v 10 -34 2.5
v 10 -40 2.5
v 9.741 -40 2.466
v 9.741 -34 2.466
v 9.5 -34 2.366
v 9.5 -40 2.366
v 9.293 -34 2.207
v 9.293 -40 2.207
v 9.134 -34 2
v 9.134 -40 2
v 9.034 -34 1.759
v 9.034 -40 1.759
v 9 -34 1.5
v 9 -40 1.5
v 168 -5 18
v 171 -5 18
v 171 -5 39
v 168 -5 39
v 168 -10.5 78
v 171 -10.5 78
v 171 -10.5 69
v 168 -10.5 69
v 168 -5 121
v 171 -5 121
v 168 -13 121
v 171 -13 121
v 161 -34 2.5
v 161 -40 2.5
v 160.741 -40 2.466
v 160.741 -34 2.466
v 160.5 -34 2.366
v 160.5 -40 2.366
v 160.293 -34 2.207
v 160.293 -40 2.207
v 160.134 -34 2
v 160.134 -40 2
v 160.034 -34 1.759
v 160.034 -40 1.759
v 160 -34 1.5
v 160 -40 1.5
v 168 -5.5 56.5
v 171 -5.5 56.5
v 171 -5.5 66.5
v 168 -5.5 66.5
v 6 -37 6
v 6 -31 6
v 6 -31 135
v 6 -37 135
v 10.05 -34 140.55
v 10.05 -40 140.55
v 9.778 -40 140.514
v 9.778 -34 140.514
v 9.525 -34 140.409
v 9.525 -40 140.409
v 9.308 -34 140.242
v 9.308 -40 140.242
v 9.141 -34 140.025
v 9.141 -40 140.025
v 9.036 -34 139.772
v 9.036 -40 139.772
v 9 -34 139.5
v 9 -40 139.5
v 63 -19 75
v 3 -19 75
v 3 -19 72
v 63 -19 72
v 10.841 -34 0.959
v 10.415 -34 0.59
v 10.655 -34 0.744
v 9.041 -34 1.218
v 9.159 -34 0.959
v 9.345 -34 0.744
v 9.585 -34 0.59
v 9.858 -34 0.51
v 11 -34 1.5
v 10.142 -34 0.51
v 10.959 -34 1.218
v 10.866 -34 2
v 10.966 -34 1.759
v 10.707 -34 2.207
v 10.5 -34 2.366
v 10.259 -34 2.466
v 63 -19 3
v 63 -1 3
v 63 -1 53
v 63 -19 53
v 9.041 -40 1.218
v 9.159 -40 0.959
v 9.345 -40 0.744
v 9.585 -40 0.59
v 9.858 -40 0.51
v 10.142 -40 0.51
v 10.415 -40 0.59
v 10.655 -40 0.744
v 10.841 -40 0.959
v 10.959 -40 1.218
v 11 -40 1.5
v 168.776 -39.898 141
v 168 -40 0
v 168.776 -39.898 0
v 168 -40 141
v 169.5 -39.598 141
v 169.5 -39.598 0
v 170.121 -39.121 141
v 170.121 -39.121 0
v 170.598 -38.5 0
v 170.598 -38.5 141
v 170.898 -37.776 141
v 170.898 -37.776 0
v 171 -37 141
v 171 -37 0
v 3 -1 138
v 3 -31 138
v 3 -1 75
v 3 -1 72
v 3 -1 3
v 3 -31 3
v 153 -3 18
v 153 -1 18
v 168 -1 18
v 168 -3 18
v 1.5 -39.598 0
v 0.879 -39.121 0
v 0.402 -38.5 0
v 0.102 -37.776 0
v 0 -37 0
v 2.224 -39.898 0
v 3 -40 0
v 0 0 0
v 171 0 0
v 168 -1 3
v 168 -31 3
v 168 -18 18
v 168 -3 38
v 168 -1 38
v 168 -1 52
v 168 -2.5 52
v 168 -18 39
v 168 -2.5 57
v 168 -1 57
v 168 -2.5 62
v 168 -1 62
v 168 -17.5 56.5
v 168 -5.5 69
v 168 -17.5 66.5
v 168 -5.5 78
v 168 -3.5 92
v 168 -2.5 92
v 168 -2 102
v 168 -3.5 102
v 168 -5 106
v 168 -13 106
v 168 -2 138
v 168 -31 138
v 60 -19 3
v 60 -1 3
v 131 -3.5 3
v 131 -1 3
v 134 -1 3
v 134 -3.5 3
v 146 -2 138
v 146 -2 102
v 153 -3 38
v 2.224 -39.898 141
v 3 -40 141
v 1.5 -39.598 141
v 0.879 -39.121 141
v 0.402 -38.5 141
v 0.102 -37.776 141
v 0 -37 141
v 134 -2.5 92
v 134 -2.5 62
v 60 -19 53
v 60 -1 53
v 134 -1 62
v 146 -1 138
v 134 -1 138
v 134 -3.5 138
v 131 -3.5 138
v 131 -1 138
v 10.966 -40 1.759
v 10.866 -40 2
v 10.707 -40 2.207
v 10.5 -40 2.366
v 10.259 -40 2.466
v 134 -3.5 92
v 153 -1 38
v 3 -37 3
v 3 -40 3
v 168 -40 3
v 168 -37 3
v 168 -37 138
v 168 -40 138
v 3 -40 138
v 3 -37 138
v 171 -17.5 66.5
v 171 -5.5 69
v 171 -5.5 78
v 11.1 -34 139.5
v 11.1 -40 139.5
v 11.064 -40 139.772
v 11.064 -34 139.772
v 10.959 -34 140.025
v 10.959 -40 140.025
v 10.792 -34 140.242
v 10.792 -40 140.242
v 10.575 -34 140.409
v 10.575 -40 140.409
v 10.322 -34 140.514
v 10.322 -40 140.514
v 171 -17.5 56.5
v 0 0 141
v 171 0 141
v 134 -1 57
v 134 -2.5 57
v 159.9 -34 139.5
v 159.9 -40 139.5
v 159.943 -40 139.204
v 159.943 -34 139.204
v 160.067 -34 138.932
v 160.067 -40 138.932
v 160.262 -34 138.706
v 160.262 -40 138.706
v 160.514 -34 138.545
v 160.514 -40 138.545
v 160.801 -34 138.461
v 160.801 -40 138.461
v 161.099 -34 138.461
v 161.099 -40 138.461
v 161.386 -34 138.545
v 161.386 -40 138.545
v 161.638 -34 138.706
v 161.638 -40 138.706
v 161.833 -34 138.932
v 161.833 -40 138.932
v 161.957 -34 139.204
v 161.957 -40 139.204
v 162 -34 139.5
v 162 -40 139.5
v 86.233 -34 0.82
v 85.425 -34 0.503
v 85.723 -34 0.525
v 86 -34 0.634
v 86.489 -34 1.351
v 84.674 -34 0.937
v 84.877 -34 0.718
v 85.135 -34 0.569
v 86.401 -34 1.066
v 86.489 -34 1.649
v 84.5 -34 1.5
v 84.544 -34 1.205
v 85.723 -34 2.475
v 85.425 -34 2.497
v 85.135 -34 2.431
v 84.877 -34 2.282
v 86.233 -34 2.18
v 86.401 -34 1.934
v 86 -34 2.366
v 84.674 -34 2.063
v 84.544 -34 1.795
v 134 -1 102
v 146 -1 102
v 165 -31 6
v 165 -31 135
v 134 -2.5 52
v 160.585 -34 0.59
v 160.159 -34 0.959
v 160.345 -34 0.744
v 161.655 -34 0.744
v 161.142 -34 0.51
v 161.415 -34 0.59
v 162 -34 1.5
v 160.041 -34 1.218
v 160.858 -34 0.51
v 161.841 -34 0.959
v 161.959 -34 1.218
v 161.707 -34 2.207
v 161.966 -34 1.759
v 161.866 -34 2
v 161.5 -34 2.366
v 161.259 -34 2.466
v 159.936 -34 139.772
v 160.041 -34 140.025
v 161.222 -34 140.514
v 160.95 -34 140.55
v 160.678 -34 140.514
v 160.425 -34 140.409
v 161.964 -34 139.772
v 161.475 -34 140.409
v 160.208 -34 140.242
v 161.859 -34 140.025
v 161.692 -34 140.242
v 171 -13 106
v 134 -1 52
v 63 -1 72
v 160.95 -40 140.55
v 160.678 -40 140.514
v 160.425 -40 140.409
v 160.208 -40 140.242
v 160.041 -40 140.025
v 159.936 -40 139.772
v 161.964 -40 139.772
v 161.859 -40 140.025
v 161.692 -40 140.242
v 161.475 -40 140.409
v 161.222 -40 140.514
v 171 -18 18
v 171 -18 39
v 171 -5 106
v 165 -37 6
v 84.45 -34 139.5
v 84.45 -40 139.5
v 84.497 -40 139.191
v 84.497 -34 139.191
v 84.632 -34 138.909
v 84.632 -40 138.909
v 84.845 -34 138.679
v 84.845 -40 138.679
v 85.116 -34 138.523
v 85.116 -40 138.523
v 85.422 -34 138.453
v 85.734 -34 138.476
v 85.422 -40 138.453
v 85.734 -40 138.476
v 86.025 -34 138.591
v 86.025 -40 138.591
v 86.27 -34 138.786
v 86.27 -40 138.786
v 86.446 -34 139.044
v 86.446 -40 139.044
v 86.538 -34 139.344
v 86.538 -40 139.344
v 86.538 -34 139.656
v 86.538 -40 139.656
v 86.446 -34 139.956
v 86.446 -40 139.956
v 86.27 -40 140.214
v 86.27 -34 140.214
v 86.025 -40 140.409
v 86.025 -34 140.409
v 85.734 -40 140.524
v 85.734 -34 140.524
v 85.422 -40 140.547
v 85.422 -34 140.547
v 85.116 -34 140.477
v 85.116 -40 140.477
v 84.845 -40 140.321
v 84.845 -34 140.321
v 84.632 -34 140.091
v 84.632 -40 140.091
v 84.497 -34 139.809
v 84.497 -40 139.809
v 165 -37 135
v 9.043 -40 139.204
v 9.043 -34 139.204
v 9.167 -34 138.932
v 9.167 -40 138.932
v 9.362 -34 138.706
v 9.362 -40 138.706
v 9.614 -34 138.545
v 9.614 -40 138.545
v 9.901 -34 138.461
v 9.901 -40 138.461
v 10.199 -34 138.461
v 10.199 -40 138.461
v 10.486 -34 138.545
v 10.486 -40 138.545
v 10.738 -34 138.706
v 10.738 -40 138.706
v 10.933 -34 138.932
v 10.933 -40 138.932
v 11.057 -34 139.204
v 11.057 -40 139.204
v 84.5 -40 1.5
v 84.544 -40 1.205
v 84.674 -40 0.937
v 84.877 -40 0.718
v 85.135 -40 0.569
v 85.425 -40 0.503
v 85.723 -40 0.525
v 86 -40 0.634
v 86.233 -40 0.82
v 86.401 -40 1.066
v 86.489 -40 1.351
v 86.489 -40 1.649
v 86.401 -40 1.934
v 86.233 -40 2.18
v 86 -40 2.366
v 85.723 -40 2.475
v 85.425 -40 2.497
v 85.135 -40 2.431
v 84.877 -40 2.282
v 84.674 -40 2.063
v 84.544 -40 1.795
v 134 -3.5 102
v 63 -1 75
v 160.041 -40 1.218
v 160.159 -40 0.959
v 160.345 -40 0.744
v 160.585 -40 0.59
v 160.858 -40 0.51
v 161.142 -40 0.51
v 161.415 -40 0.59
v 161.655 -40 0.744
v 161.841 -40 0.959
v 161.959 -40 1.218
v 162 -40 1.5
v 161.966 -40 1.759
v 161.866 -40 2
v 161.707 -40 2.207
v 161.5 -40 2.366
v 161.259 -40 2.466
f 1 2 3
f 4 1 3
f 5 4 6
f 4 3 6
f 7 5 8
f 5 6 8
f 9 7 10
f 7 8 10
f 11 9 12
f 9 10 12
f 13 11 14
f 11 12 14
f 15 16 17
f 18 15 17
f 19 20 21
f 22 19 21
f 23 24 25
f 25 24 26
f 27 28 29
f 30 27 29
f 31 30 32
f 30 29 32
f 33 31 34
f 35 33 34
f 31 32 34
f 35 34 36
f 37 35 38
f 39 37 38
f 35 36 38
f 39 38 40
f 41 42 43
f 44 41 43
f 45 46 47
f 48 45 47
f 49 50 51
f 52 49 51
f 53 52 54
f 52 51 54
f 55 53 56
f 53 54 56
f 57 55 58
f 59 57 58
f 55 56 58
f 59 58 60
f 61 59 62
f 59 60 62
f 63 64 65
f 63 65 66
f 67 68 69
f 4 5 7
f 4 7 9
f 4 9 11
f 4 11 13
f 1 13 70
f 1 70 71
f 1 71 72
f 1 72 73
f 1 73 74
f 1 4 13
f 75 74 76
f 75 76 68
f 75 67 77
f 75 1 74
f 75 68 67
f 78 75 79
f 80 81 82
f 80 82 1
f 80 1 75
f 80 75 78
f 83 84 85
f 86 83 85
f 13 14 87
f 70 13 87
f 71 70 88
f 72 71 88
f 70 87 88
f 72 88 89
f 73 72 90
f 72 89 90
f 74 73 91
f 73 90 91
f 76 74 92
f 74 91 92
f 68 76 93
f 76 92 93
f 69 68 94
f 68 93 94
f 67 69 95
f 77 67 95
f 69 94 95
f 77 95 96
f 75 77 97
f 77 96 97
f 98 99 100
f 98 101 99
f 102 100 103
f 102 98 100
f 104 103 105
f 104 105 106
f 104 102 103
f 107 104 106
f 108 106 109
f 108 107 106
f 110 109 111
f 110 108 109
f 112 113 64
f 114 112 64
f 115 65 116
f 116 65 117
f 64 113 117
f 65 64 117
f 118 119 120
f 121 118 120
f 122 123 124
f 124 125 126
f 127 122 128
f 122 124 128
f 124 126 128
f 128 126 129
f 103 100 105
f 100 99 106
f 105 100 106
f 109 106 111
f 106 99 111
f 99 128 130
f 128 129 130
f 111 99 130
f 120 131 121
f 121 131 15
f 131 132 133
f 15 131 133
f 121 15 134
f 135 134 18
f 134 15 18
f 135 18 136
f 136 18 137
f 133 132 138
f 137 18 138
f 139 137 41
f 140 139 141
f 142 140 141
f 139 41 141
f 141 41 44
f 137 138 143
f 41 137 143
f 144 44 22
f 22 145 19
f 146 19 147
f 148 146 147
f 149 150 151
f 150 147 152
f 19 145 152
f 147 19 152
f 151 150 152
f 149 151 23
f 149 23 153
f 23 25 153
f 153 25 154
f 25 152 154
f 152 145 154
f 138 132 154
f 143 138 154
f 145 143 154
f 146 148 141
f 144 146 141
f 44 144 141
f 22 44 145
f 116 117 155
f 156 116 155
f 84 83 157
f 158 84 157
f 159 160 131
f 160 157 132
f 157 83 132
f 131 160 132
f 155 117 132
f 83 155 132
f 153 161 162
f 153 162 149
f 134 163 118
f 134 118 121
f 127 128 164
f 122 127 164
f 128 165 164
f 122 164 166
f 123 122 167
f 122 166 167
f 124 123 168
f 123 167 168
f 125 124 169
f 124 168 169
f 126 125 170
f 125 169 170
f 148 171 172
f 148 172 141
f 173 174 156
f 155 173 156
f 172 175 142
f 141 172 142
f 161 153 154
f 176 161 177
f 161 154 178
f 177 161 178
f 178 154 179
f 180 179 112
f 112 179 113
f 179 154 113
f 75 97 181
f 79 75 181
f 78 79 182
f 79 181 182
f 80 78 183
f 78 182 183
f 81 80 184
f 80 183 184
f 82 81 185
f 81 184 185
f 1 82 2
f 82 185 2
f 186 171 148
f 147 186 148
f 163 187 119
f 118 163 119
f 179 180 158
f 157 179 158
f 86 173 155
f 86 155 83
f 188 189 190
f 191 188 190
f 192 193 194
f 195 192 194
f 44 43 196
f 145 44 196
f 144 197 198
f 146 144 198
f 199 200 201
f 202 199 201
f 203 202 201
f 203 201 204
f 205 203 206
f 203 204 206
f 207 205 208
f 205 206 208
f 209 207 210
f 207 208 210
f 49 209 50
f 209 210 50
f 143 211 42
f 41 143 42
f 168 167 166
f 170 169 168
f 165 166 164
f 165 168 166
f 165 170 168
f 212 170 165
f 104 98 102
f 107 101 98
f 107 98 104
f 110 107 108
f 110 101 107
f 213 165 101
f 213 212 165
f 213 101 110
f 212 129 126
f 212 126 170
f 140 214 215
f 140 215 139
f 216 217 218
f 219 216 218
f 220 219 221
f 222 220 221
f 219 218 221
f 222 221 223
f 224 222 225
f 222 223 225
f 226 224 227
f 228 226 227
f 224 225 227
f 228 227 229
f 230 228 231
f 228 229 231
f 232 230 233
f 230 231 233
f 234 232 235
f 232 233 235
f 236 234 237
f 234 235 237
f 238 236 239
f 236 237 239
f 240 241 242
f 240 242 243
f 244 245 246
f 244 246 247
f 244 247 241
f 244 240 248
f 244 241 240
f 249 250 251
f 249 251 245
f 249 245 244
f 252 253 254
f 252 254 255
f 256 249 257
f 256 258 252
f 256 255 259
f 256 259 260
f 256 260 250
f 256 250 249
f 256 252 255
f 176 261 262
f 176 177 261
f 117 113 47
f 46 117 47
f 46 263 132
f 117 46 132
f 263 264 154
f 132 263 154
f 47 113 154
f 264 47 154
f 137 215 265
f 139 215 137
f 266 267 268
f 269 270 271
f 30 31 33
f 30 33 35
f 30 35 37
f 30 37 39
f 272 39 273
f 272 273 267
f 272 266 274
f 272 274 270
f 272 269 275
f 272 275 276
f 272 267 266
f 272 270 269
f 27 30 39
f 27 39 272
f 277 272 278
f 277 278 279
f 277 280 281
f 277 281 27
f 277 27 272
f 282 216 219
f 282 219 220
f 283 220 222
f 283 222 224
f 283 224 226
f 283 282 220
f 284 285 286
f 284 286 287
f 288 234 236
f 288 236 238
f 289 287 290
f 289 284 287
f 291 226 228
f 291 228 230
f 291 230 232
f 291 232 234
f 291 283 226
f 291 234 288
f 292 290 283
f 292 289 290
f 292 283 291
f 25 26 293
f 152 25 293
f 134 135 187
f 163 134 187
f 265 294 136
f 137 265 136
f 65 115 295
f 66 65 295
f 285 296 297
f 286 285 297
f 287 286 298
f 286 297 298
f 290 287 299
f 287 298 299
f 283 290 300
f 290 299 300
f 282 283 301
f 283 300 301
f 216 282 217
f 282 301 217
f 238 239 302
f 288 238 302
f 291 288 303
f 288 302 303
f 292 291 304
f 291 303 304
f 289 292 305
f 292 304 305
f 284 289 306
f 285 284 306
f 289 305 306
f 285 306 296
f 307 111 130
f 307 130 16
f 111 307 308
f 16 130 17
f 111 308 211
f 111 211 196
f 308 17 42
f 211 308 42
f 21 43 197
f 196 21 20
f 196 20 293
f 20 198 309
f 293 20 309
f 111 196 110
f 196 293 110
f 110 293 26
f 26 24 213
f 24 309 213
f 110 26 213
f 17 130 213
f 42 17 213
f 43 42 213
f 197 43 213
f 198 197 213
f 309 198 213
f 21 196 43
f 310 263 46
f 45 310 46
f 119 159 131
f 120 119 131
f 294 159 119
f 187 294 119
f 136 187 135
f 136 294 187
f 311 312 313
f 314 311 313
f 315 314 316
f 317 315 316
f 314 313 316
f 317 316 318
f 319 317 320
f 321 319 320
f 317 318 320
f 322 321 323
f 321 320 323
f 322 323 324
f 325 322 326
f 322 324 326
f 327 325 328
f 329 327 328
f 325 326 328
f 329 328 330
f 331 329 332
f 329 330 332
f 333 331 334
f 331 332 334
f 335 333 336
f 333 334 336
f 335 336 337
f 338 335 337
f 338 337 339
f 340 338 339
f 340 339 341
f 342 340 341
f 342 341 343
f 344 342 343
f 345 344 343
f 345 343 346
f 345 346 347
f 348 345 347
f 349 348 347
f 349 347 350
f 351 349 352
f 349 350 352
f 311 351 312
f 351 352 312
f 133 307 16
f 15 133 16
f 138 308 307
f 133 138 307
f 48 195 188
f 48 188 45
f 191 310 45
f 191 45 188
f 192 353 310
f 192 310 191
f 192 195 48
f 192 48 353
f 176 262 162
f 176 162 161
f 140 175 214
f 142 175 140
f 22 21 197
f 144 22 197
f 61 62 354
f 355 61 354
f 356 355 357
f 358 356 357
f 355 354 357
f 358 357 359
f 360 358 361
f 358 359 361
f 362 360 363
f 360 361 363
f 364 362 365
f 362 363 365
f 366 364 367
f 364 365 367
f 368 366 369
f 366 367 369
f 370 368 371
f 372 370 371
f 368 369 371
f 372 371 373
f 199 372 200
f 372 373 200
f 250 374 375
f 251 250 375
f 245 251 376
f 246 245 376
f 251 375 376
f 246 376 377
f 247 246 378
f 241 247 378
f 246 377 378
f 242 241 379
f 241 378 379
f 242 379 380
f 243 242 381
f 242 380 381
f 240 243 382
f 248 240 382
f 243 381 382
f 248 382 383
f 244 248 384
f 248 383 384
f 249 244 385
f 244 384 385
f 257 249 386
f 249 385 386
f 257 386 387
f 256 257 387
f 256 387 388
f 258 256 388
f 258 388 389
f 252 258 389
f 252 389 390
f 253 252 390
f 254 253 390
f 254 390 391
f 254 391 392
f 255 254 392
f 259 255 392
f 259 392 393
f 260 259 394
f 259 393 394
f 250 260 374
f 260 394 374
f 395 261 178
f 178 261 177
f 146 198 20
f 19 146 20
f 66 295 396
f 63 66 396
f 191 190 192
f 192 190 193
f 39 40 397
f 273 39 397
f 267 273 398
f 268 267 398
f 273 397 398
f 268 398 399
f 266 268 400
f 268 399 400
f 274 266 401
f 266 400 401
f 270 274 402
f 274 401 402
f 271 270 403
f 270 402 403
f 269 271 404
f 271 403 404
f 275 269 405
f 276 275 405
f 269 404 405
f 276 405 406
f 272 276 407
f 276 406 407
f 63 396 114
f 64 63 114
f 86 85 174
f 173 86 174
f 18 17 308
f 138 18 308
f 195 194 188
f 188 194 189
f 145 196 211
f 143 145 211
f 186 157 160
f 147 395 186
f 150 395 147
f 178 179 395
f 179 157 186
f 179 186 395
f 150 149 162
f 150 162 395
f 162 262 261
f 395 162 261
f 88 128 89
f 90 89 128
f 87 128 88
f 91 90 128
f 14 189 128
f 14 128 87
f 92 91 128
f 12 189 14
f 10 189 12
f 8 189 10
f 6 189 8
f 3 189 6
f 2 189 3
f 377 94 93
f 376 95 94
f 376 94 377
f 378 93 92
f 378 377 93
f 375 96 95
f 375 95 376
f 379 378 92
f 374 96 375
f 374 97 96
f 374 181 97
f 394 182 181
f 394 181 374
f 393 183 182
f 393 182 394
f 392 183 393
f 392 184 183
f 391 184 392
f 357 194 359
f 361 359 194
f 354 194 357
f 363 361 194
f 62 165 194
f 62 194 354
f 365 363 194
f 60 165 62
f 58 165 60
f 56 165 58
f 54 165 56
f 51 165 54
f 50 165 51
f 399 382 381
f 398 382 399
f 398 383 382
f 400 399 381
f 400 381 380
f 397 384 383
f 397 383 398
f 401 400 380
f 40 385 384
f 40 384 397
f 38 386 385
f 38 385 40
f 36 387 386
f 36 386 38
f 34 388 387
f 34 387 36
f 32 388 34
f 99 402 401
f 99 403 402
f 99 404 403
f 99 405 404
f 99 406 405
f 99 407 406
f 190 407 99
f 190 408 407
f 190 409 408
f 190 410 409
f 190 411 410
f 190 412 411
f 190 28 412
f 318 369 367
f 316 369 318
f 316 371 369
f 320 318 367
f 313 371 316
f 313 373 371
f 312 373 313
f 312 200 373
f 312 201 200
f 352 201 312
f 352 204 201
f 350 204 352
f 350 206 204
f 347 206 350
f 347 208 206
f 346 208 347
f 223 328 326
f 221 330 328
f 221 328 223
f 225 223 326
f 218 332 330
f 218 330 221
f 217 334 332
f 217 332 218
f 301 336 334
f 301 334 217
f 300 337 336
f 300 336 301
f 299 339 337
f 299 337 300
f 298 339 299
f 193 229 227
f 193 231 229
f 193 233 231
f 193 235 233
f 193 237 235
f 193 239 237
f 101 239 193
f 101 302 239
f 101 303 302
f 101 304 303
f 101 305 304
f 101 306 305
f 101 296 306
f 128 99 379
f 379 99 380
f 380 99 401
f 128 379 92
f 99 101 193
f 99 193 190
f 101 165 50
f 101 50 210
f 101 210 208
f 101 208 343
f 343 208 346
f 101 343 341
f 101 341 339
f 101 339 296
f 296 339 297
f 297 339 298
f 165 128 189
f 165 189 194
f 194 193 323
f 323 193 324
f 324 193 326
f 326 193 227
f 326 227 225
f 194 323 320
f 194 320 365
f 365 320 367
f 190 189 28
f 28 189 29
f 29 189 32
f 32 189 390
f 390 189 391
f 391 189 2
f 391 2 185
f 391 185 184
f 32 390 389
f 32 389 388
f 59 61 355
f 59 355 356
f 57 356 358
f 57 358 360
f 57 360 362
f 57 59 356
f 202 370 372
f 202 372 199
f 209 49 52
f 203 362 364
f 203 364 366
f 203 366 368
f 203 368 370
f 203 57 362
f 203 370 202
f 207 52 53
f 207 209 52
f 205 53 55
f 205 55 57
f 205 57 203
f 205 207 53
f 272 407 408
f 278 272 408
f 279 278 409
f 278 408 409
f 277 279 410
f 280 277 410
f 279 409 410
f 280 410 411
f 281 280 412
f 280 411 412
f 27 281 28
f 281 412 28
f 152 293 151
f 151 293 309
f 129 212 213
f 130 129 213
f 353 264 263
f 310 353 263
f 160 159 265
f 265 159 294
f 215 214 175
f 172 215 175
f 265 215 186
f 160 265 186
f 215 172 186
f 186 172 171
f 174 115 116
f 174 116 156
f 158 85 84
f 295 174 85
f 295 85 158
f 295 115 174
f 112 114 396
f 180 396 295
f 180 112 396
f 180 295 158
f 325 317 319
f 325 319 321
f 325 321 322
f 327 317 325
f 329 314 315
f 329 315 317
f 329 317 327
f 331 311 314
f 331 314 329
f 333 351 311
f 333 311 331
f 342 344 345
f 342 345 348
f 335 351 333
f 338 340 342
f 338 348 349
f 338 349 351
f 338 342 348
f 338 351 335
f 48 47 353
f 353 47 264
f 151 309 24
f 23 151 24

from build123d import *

# Parameters (mm, degrees)
F0_W      = 171
F0_H      = 141
F1_DEPTH  = 40
F2_W      = 82.5
F2_H      = 67.5
F3_DEPTH  = 3
F4_W      = 80.5
F4_H      = 65.5
F5_DEPTH  = 3
F6_W      = 82.5
F6_H      = 67.5
F7_DEPTH  = 36
F9_START  = 30
F9_DEPTH  = 6
F11_DEPTH = 39.9
F12_R     = 2.99999
F13_R     = 2.99999
F15_DEPTH = 87.6
F17_DEPTH = 58
F19_DEPTH = 2.5
F20_W     = 34
F20_H     = 30
F20_H_2   = 5
F21_DEPTH = 1.5
F22_W     = 22
F22_H     = 36
F23_DEPTH = 1
F25_DEPTH = 107.7
F27_DEPTH = 2
F29_DEPTH = 18
F31_DEPTH = 6
F33_DEPTH = 6


# Not quite as in the source:
# - a fillet or chamfer is up to 0.001 mm smaller than in the source, because OpenCascade refuses the exact size


with BuildPart() as f1:
    # F0 (on Front) → F1 (new body)
    with BuildSketch(Plane.XZ):
        with Locations((85.5, 70.5)):
            Rectangle(F0_W, F0_H)
    extrude(amount=F1_DEPTH)

    # F2 (on face) → F3 (cut)
    with BuildSketch(Plane.XZ.offset(40)):
        with Locations((126.75, 104.25)):
            Rectangle(F2_W, F2_H)
        with Locations((44.25, 104.25)):
            Rectangle(F2_W, F2_H)
        with Locations((126.75, 36.75)):
            Rectangle(F2_W, F2_H)
        with Locations((44.25, 36.75)):
            Rectangle(F2_W, F2_H)
    extrude(amount=-F3_DEPTH, mode=Mode.SUBTRACT)

    # F4 (on face) → F5 (cut)
    with BuildSketch(Plane.XZ.offset(37)):
        with Locations((45.25, 103.25)):
            Rectangle(F4_W, F4_H)
        with Locations((125.75, 103.25)):
            Rectangle(F4_W, F4_H)
        with Locations((125.75, 37.75)):
            Rectangle(F4_W, F4_H)
        with Locations((45.25, 37.75)):
            Rectangle(F4_W, F4_H)
    extrude(amount=-F5_DEPTH, mode=Mode.SUBTRACT)

    # F6 (on face) → F7 (cut)
    with BuildSketch(Plane.XZ.offset(37)):
        with Locations((126.75, 104.25)):
            Rectangle(F6_W, F6_H)
        with Locations((44.25, 104.25)):
            Rectangle(F6_W, F6_H)
        with Locations((126.75, 36.75)):
            Rectangle(F6_W, F6_H)
        with Locations((44.25, 36.75)):
            Rectangle(F6_W, F6_H)
    extrude(amount=-F7_DEPTH, mode=Mode.SUBTRACT)

    # F8 (on face) → F9 (join)
    with BuildSketch(Plane.XZ.offset(1).offset(F9_START)):
        Polygon((3, 138), (3, 70.5), (6, 70.5), (6, 135), (85.5, 135), (85.5, 138), align=None)
        Polygon((3, 70.5), (3, 3), (85.5, 3), (85.5, 6), (6, 6), (6, 70.5), align=None)
        Polygon((85.5, 6), (85.5, 3), (168, 3), (168, 70.5), (165, 70.5), (165, 6), align=None)
        Polygon((165, 70.5), (168, 70.5), (168, 138), (85.5, 138), (85.5, 135), (165, 135), align=None)
    extrude(amount=F9_DEPTH)

    # F10 (on face) → F11 (cut)
    with BuildSketch(Plane.YZ.offset(171)):
        Polygon((-13, 121), (-13, 106), (-5, 106), (-5, 113.5), (-5, 121), (-9, 121), align=None)
    extrude(amount=-F11_DEPTH, mode=Mode.SUBTRACT)

    # F12 (radius 3 in the source; OpenCascade refuses exactly that, so slightly less here)
    f12_edges = [f1.edges().sort_by_distance(p)[0] for p in [
        (171, -40, 70.5),
    ]]
    fillet(f12_edges, radius=F12_R)

    # F13 (radius 3 in the source; OpenCascade refuses exactly that, so slightly less here)
    f13_edges = [f1.edges().sort_by_distance(p)[0] for p in [
        (0, -40, 70.5),
    ]]
    fillet(f13_edges, radius=F13_R)

    # F14 (on face) → F15 (cut)
    with BuildSketch(Plane.YZ.offset(171)):
        Polygon((-10.5, 78), (-10.5, 69), (-5.5, 69), (-5.5, 73.5), (-5.5, 78), (-8, 78), align=None)
    extrude(amount=-F15_DEPTH, mode=Mode.SUBTRACT)

    # F16 (on face) → F17 (cut)
    with BuildSketch(Plane.YZ.offset(171)):
        Polygon((-17.5, 66.5), (-17.5, 56.5), (-5.5, 56.5), (-5.5, 61.5), (-5.5, 66.5), (-11.5, 66.5), align=None)
    extrude(amount=-F17_DEPTH, mode=Mode.SUBTRACT)

    # F18 (on face) → F19 (join)
    with BuildSketch(Plane.XZ.offset(1)):
        Polygon((134, 138), (131, 138), (131, 3), (134, 3), (134, 70.5), (134, 92), (134, 102), align=None)
        Polygon((151, 102), (134, 102), (134, 92), (168, 92), (168, 102), align=None)
    extrude(amount=F19_DEPTH)

    # F20 (on face) → F21 (join)
    with BuildSketch(Plane.XZ.offset(1)):
        with Locations((151, 77)):
            Rectangle(F20_W, F20_H)
        with Locations((151, 54.5)):
            Rectangle(F20_W, F20_H_2)
    extrude(amount=F21_DEPTH)

    # F22 (on face) → F23 (join)
    with BuildSketch(Plane.XZ.offset(1)):
        with Locations((157, 120)):
            Rectangle(F22_W, F22_H)
    extrude(amount=F23_DEPTH)

    # F24 (on face) → F25 (cut)
    with BuildSketch(Plane.YZ.offset(171)):
        Polygon((-18, 39), (-18, 18), (-11.5, 18), (-5, 18), (-5, 28.5), (-5, 39), align=None)
    extrude(amount=-F25_DEPTH, mode=Mode.SUBTRACT)

    # F26 (on face) → F27 (join)
    with BuildSketch(Plane.XZ.offset(1)):
        Polygon((168, 18), (168, 38), (153, 38), (153, 18), (160.5, 18), align=None)
    extrude(amount=F27_DEPTH)

    # F28 (on face) → F29 (join)
    with BuildSketch(Plane.XZ.offset(1)):
        Polygon((60, 53), (60, 28), (60, 3), (63, 3), (63, 53), align=None)
        Polygon((63, 75), (3, 75), (3, 72), (33, 72), (63, 72), align=None)
    extrude(amount=F29_DEPTH)

    # F30 (on face) → F31 (cut)
    with BuildSketch(Plane.XZ.offset(40)):
        with BuildLine():
            Line((10.05, 139.5), (9, 139.5))
            ThreePointArc((9, 139.5), (10.05, 138.45), (11.1, 139.5))
            Line((11.1, 139.5), (10.05, 139.5))
        make_face()
        with BuildLine():
            ThreePointArc((160.95, 140.55), (160.2075378798, 140.2424621202), (159.9, 139.5))
            Line((159.9, 139.5), (160.95, 139.5))
            Line((160.95, 139.5), (160.95, 140.55))
        make_face()
        with BuildLine():
            Line((160.95, 139.5), (159.9, 139.5))
            ThreePointArc((159.9, 139.5), (160.95, 138.45), (162, 139.5))
            Line((162, 139.5), (160.95, 139.5))
        make_face()
        with BuildLine():
            ThreePointArc((86.55, 139.5), (85.5, 140.55), (84.45, 139.5))
            Line((84.45, 139.5), (86.55, 139.5))
        make_face()
        with BuildLine():
            Line((86.55, 139.5), (84.45, 139.5))
            ThreePointArc((84.45, 139.5), (85.5, 138.45), (86.55, 139.5))
        make_face()
        with BuildLine():
            ThreePointArc((10.05, 140.55), (9.3075378798, 140.2424621202), (9, 139.5))
            Line((9, 139.5), (10.05, 139.5))
            Line((10.05, 139.5), (10.05, 140.55))
        make_face()
        with BuildLine():
            Line((10.05, 139.5), (11.1, 139.5))
            ThreePointArc((11.1, 139.5), (10.7924621202, 140.2424621202), (10.05, 140.55))
            Line((10.05, 140.55), (10.05, 139.5))
        make_face()
        with BuildLine():
            ThreePointArc((162, 139.5), (161.6924621202, 140.2424621202), (160.95, 140.55))
            Line((160.95, 140.55), (160.95, 139.5))
            Line((160.95, 139.5), (162, 139.5))
        make_face()
    extrude(amount=-F31_DEPTH, mode=Mode.SUBTRACT)

    # F32 (on face) → F33 (cut)
    with BuildSketch(Plane.XZ.offset(40)):
        with BuildLine():
            Line((10, 1.5), (9, 1.5))
            ThreePointArc((9, 1.5), (10, 0.5), (11, 1.5))
            Line((11, 1.5), (10, 1.5))
        make_face()
        with BuildLine():
            ThreePointArc((161, 2.5), (160.2928932188, 2.2071067812), (160, 1.5))
            Line((160, 1.5), (161, 1.5))
            Line((161, 1.5), (161, 2.5))
        make_face()
        with BuildLine():
            Line((161, 1.5), (160, 1.5))
            ThreePointArc((160, 1.5), (161, 0.5), (162, 1.5))
            Line((162, 1.5), (161, 1.5))
        make_face()
        with BuildLine():
            ThreePointArc((86.5, 1.5), (85.5, 2.5), (84.5, 1.5))
            Line((84.5, 1.5), (86.5, 1.5))
        make_face()
        with BuildLine():
            Line((86.5, 1.5), (84.5, 1.5))
            ThreePointArc((84.5, 1.5), (85.5, 0.5), (86.5, 1.5))
        make_face()
        with BuildLine():
            ThreePointArc((10, 2.5), (9.2928932188, 2.2071067812), (9, 1.5))
            Line((9, 1.5), (10, 1.5))
            Line((10, 1.5), (10, 2.5))
        make_face()
        with BuildLine():
            Line((10, 1.5), (11, 1.5))
            ThreePointArc((11, 1.5), (10.7071067812, 2.2071067812), (10, 2.5))
            Line((10, 2.5), (10, 1.5))
        make_face()
        with BuildLine():
            ThreePointArc((162, 1.5), (161.7071067812, 2.2071067812), (161, 2.5))
            Line((161, 2.5), (161, 1.5))
            Line((161, 1.5), (162, 1.5))
        make_face()
    extrude(amount=-F33_DEPTH, mode=Mode.SUBTRACT)


solid = f1.part
